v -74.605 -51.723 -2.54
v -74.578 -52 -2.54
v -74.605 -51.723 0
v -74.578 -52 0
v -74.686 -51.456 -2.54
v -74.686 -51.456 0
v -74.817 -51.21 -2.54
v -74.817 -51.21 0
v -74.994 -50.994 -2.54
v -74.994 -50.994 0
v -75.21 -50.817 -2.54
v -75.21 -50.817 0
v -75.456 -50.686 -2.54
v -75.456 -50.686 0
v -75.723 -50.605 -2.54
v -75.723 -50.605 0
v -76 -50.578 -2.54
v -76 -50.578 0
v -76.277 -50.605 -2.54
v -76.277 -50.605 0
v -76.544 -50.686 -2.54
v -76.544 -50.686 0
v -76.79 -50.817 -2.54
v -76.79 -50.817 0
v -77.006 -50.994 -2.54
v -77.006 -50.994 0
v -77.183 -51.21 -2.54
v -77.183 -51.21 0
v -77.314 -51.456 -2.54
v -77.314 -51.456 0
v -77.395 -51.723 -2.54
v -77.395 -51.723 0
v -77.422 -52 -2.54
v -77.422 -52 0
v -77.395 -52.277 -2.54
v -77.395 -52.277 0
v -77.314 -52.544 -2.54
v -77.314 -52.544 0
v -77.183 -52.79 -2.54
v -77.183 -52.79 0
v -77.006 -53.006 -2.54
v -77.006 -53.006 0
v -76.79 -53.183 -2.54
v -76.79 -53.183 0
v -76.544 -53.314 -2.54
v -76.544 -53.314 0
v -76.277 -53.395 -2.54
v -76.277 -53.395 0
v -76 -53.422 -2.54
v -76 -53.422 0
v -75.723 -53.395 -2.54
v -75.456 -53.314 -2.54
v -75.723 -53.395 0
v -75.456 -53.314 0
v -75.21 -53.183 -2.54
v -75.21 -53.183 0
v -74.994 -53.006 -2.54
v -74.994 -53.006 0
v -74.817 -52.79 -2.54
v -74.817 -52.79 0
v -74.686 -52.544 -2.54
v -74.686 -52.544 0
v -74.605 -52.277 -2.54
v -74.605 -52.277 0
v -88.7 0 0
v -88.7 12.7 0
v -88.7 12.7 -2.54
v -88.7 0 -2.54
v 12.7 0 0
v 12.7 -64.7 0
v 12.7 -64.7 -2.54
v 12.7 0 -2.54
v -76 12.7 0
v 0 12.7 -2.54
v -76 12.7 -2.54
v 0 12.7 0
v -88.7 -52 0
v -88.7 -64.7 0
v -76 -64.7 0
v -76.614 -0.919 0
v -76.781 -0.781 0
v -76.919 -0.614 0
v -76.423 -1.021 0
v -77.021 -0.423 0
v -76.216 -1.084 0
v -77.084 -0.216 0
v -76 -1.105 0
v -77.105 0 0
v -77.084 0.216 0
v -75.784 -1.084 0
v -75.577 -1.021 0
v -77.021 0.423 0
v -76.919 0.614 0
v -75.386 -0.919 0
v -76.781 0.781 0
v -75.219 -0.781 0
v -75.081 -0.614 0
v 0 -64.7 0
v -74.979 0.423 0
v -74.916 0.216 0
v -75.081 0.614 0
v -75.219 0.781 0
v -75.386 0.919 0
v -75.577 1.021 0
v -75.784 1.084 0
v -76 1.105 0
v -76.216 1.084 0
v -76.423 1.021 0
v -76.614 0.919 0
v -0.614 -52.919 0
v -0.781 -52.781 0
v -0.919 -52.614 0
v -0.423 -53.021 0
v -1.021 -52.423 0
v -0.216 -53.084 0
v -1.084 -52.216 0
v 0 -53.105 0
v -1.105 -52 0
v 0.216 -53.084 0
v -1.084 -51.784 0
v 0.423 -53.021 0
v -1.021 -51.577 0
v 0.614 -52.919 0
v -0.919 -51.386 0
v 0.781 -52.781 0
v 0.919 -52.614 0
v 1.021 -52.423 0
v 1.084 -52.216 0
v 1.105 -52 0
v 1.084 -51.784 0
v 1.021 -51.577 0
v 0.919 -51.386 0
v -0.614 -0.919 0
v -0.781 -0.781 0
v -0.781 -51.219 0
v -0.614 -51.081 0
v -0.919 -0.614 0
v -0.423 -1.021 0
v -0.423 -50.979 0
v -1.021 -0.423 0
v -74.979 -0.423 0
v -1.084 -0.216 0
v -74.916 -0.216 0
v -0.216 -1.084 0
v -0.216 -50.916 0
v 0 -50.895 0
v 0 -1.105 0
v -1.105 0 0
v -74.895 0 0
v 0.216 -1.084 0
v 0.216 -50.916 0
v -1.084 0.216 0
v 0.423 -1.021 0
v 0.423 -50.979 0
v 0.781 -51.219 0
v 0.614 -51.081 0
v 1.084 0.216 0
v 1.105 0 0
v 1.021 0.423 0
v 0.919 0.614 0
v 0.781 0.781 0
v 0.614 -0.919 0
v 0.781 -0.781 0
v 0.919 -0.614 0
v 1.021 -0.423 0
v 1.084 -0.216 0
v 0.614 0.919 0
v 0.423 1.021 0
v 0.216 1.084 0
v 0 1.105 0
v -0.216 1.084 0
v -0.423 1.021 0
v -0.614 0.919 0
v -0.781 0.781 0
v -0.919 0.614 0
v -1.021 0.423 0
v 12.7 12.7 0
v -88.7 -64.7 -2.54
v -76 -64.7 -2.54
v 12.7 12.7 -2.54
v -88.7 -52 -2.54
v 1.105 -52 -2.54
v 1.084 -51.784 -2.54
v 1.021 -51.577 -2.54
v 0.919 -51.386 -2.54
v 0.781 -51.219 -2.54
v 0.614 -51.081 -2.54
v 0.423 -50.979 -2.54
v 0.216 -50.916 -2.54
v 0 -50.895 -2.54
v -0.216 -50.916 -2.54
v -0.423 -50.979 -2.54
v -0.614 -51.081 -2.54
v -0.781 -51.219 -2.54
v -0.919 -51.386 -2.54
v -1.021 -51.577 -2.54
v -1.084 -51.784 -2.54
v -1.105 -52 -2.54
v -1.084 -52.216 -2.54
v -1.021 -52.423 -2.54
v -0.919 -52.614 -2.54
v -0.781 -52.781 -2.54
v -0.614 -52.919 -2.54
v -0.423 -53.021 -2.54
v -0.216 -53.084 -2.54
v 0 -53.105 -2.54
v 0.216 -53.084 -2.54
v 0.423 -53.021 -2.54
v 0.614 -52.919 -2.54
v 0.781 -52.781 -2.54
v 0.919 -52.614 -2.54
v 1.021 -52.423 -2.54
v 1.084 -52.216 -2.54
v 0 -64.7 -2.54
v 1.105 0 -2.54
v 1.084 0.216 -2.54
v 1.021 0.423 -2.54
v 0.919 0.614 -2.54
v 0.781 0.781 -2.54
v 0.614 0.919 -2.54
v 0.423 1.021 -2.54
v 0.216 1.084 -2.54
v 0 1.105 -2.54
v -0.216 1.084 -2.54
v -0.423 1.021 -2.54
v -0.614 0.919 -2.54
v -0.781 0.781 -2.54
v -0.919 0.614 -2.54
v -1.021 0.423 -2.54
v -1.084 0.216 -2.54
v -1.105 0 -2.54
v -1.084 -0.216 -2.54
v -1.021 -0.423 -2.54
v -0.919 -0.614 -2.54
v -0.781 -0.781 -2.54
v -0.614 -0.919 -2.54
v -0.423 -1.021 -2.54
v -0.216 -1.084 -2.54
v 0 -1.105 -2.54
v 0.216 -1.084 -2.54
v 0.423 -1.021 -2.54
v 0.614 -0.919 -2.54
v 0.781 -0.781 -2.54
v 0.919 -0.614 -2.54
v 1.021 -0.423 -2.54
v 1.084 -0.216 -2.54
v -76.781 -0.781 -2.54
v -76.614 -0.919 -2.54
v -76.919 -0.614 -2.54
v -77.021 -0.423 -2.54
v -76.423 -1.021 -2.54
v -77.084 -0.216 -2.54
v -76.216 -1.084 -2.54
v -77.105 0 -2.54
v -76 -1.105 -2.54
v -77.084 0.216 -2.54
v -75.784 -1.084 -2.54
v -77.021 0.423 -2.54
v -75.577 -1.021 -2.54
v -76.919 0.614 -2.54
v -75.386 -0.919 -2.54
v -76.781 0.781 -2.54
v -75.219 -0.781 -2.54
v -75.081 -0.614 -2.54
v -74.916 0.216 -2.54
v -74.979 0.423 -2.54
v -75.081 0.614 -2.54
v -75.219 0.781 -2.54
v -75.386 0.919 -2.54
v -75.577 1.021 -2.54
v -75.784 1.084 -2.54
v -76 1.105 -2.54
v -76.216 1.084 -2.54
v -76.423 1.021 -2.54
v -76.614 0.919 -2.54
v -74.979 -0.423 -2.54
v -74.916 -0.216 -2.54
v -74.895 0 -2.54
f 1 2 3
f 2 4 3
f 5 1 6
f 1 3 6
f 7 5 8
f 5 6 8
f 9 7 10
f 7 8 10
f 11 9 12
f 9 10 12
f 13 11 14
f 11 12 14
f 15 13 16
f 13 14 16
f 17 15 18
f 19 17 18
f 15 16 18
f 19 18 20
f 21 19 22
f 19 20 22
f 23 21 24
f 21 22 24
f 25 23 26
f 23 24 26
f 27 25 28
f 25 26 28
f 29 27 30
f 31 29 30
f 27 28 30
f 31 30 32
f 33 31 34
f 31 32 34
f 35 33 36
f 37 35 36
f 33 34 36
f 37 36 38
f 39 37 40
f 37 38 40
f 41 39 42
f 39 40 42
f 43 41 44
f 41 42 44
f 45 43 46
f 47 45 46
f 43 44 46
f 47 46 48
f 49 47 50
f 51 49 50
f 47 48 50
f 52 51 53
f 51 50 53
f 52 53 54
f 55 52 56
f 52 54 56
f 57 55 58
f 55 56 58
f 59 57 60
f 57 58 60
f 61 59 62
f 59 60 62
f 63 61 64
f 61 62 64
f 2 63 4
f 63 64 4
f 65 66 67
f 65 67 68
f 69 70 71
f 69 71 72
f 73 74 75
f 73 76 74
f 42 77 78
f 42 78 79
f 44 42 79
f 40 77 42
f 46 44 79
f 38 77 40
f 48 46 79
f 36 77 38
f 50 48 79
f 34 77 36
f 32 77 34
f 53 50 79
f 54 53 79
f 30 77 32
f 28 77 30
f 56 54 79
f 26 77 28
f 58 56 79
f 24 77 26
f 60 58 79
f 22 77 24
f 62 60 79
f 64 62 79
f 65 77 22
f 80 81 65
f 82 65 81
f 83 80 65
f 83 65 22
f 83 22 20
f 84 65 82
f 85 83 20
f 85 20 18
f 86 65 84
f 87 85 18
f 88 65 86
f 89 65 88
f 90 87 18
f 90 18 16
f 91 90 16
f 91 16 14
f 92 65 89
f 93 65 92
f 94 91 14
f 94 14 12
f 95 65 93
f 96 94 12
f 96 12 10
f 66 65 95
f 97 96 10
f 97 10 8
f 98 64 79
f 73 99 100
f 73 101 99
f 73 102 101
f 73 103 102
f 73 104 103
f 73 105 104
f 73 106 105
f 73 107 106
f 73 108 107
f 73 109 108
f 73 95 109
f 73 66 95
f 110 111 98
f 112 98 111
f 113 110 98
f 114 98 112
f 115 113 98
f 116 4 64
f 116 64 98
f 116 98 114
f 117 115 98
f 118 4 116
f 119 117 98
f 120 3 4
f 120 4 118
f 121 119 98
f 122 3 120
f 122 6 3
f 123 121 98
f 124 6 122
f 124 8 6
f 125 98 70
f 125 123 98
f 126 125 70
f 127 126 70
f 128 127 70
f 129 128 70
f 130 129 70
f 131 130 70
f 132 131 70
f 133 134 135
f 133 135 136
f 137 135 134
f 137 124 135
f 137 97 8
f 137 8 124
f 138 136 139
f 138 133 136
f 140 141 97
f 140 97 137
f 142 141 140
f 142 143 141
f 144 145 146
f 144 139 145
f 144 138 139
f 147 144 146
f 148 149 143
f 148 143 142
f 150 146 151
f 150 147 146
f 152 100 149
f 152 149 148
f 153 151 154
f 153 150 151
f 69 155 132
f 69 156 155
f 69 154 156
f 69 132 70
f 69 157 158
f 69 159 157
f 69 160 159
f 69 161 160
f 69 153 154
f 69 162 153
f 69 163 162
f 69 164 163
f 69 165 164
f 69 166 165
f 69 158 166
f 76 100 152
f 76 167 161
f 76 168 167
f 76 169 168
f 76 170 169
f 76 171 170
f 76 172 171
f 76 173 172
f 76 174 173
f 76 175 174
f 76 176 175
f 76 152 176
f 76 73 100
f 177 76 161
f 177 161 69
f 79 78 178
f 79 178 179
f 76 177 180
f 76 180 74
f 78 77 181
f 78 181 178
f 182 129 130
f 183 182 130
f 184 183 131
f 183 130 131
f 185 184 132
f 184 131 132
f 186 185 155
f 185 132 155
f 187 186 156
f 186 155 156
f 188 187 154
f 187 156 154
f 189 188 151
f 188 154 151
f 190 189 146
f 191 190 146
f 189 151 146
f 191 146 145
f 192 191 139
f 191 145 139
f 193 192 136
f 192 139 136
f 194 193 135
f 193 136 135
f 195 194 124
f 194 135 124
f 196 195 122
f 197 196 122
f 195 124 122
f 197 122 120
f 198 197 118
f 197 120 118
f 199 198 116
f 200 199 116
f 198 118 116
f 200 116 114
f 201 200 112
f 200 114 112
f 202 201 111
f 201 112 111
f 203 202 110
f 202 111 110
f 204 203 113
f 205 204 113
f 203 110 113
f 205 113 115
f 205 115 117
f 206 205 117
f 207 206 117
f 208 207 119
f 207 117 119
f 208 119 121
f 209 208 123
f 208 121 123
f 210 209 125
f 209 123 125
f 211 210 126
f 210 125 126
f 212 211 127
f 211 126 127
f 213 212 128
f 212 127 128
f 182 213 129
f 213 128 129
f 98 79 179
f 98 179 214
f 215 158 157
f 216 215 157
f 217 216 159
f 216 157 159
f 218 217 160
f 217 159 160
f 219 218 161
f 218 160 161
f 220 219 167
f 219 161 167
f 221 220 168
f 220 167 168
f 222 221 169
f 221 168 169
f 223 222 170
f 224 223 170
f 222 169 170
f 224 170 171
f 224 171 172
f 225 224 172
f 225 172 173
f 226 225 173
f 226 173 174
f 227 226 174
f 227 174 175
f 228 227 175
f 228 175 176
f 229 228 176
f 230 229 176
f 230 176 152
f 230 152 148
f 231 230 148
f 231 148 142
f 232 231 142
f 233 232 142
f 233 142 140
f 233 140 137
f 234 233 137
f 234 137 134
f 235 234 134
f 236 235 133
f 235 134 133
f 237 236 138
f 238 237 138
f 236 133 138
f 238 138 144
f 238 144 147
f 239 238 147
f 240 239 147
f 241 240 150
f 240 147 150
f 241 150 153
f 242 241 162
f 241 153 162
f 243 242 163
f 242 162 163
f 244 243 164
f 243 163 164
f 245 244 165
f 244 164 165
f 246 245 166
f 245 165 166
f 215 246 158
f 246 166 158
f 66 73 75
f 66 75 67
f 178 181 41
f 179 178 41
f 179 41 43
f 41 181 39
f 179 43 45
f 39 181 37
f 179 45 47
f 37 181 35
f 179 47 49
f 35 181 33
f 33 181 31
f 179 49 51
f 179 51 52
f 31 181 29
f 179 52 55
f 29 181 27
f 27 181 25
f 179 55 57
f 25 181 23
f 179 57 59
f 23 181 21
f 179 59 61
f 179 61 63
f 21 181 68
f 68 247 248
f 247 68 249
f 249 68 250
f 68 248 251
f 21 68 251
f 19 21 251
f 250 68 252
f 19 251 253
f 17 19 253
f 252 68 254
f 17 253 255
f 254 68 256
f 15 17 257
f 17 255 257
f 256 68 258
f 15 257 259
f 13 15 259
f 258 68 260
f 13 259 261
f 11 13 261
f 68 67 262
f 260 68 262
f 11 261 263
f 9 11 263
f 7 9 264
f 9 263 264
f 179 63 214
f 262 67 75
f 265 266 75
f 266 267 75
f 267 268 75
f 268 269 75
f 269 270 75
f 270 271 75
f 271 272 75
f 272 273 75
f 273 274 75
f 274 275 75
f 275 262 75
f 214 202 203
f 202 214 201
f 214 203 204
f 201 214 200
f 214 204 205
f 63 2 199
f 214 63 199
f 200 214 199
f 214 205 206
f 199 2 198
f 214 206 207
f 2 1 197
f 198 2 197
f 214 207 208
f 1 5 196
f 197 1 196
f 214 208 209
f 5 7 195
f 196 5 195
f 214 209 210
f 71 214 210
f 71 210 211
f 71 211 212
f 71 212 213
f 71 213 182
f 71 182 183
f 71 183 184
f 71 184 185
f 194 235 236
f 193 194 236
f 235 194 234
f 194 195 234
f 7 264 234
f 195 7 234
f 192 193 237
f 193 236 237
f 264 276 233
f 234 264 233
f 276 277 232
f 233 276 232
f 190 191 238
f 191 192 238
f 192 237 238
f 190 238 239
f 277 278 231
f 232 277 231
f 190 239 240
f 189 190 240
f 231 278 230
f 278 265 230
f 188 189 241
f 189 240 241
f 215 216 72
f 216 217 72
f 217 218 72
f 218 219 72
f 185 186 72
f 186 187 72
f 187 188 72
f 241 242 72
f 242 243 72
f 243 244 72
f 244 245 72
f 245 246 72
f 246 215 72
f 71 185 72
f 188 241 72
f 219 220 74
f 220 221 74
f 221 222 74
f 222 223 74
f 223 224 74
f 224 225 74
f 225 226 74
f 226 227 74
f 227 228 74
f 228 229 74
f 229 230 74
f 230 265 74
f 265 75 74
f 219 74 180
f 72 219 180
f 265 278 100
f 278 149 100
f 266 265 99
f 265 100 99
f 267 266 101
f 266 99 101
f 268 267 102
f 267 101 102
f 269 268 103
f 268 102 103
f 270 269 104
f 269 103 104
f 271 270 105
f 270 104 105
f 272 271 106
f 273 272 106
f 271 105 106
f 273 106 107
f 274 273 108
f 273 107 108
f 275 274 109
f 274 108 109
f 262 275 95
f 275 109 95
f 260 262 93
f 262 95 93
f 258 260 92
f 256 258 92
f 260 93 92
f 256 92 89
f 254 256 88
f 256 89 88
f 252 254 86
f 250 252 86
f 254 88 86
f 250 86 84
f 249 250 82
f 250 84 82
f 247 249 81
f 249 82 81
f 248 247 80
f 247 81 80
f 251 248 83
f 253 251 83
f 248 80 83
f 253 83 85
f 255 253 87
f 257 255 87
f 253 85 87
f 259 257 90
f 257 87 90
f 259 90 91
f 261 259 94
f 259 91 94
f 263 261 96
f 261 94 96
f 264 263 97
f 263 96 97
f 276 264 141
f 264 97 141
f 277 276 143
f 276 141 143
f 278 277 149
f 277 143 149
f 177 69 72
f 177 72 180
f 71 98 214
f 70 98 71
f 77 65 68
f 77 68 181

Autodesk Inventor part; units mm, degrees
ref_plane "YZ Plane" through (0, 0, 0) normal (1, 0, 0) x (0, 1, 0)
ref_plane "XZ Plane" through (0, 0, 0) normal (0, 1, 0) x (-1, 0, 0)
ref_plane "XY Plane" through (0, 0, 0) normal (0, 0, 1) x (1, 0, 0)
sketch "Sketch1" plane through (0, 0, 0) normal (0, 0, 1) x (1, 0, 0)
  line L0 (12.7, 0) -> (12.7, 12.7)
  circle A0 centre (-76, -52) radius 1.4224 projected
  line L1 (-88.7, -64.7) -> (-76, -64.7)
  line L2 (-88.7, -64.7) -> (12.7, -64.7)
  line L3 (12.7, -64.7) -> (12.7, 12.7)
  line L4 (12.7, 12.7) -> (-88.7, 12.7)
  line L5 (-88.7, 12.7) -> (-88.7, -64.7)
  line L6 (-88.7, 12.7) -> (-76, 12.7)
  line L7 (-88.7, 0) -> (-88.7, 12.7)
  line L8 (-88.7, -64.7) -> (-76, -64.7)
  line L9 (-88.7, -52) -> (-88.7, -64.7)
  line L10 (12.7, -64.7) -> (0, -64.7)
  line L11 (12.7, 12.7) -> (0, 12.7)
  line L12 (12.7, 0) -> (12.7, 12.7)
  circle A1 centre (-76, 0) radius 1.1049
  circle A2 centre (-76, -52) radius 1.1049
  circle A3 centre (0, 0) radius 1.1049
  circle A4 centre (0, -52) radius 1.1049
  dimension "d1" = 12.7
  dimension "d2" = 12.7
  dimension "d10" = 12.7
  dimension "d11" = 12.7
  dimension "d12" = 2.2098
  dimension "d13" = 2.2098
  dimension "d14" = 2.2098
  dimension "d15" = 2.2098
extrude "Extrusion2" add sketch "Sketch1" against normal blind 2.54 contours L3 L2 L1 L5 L4 L0
properties part number "BasePlate"
